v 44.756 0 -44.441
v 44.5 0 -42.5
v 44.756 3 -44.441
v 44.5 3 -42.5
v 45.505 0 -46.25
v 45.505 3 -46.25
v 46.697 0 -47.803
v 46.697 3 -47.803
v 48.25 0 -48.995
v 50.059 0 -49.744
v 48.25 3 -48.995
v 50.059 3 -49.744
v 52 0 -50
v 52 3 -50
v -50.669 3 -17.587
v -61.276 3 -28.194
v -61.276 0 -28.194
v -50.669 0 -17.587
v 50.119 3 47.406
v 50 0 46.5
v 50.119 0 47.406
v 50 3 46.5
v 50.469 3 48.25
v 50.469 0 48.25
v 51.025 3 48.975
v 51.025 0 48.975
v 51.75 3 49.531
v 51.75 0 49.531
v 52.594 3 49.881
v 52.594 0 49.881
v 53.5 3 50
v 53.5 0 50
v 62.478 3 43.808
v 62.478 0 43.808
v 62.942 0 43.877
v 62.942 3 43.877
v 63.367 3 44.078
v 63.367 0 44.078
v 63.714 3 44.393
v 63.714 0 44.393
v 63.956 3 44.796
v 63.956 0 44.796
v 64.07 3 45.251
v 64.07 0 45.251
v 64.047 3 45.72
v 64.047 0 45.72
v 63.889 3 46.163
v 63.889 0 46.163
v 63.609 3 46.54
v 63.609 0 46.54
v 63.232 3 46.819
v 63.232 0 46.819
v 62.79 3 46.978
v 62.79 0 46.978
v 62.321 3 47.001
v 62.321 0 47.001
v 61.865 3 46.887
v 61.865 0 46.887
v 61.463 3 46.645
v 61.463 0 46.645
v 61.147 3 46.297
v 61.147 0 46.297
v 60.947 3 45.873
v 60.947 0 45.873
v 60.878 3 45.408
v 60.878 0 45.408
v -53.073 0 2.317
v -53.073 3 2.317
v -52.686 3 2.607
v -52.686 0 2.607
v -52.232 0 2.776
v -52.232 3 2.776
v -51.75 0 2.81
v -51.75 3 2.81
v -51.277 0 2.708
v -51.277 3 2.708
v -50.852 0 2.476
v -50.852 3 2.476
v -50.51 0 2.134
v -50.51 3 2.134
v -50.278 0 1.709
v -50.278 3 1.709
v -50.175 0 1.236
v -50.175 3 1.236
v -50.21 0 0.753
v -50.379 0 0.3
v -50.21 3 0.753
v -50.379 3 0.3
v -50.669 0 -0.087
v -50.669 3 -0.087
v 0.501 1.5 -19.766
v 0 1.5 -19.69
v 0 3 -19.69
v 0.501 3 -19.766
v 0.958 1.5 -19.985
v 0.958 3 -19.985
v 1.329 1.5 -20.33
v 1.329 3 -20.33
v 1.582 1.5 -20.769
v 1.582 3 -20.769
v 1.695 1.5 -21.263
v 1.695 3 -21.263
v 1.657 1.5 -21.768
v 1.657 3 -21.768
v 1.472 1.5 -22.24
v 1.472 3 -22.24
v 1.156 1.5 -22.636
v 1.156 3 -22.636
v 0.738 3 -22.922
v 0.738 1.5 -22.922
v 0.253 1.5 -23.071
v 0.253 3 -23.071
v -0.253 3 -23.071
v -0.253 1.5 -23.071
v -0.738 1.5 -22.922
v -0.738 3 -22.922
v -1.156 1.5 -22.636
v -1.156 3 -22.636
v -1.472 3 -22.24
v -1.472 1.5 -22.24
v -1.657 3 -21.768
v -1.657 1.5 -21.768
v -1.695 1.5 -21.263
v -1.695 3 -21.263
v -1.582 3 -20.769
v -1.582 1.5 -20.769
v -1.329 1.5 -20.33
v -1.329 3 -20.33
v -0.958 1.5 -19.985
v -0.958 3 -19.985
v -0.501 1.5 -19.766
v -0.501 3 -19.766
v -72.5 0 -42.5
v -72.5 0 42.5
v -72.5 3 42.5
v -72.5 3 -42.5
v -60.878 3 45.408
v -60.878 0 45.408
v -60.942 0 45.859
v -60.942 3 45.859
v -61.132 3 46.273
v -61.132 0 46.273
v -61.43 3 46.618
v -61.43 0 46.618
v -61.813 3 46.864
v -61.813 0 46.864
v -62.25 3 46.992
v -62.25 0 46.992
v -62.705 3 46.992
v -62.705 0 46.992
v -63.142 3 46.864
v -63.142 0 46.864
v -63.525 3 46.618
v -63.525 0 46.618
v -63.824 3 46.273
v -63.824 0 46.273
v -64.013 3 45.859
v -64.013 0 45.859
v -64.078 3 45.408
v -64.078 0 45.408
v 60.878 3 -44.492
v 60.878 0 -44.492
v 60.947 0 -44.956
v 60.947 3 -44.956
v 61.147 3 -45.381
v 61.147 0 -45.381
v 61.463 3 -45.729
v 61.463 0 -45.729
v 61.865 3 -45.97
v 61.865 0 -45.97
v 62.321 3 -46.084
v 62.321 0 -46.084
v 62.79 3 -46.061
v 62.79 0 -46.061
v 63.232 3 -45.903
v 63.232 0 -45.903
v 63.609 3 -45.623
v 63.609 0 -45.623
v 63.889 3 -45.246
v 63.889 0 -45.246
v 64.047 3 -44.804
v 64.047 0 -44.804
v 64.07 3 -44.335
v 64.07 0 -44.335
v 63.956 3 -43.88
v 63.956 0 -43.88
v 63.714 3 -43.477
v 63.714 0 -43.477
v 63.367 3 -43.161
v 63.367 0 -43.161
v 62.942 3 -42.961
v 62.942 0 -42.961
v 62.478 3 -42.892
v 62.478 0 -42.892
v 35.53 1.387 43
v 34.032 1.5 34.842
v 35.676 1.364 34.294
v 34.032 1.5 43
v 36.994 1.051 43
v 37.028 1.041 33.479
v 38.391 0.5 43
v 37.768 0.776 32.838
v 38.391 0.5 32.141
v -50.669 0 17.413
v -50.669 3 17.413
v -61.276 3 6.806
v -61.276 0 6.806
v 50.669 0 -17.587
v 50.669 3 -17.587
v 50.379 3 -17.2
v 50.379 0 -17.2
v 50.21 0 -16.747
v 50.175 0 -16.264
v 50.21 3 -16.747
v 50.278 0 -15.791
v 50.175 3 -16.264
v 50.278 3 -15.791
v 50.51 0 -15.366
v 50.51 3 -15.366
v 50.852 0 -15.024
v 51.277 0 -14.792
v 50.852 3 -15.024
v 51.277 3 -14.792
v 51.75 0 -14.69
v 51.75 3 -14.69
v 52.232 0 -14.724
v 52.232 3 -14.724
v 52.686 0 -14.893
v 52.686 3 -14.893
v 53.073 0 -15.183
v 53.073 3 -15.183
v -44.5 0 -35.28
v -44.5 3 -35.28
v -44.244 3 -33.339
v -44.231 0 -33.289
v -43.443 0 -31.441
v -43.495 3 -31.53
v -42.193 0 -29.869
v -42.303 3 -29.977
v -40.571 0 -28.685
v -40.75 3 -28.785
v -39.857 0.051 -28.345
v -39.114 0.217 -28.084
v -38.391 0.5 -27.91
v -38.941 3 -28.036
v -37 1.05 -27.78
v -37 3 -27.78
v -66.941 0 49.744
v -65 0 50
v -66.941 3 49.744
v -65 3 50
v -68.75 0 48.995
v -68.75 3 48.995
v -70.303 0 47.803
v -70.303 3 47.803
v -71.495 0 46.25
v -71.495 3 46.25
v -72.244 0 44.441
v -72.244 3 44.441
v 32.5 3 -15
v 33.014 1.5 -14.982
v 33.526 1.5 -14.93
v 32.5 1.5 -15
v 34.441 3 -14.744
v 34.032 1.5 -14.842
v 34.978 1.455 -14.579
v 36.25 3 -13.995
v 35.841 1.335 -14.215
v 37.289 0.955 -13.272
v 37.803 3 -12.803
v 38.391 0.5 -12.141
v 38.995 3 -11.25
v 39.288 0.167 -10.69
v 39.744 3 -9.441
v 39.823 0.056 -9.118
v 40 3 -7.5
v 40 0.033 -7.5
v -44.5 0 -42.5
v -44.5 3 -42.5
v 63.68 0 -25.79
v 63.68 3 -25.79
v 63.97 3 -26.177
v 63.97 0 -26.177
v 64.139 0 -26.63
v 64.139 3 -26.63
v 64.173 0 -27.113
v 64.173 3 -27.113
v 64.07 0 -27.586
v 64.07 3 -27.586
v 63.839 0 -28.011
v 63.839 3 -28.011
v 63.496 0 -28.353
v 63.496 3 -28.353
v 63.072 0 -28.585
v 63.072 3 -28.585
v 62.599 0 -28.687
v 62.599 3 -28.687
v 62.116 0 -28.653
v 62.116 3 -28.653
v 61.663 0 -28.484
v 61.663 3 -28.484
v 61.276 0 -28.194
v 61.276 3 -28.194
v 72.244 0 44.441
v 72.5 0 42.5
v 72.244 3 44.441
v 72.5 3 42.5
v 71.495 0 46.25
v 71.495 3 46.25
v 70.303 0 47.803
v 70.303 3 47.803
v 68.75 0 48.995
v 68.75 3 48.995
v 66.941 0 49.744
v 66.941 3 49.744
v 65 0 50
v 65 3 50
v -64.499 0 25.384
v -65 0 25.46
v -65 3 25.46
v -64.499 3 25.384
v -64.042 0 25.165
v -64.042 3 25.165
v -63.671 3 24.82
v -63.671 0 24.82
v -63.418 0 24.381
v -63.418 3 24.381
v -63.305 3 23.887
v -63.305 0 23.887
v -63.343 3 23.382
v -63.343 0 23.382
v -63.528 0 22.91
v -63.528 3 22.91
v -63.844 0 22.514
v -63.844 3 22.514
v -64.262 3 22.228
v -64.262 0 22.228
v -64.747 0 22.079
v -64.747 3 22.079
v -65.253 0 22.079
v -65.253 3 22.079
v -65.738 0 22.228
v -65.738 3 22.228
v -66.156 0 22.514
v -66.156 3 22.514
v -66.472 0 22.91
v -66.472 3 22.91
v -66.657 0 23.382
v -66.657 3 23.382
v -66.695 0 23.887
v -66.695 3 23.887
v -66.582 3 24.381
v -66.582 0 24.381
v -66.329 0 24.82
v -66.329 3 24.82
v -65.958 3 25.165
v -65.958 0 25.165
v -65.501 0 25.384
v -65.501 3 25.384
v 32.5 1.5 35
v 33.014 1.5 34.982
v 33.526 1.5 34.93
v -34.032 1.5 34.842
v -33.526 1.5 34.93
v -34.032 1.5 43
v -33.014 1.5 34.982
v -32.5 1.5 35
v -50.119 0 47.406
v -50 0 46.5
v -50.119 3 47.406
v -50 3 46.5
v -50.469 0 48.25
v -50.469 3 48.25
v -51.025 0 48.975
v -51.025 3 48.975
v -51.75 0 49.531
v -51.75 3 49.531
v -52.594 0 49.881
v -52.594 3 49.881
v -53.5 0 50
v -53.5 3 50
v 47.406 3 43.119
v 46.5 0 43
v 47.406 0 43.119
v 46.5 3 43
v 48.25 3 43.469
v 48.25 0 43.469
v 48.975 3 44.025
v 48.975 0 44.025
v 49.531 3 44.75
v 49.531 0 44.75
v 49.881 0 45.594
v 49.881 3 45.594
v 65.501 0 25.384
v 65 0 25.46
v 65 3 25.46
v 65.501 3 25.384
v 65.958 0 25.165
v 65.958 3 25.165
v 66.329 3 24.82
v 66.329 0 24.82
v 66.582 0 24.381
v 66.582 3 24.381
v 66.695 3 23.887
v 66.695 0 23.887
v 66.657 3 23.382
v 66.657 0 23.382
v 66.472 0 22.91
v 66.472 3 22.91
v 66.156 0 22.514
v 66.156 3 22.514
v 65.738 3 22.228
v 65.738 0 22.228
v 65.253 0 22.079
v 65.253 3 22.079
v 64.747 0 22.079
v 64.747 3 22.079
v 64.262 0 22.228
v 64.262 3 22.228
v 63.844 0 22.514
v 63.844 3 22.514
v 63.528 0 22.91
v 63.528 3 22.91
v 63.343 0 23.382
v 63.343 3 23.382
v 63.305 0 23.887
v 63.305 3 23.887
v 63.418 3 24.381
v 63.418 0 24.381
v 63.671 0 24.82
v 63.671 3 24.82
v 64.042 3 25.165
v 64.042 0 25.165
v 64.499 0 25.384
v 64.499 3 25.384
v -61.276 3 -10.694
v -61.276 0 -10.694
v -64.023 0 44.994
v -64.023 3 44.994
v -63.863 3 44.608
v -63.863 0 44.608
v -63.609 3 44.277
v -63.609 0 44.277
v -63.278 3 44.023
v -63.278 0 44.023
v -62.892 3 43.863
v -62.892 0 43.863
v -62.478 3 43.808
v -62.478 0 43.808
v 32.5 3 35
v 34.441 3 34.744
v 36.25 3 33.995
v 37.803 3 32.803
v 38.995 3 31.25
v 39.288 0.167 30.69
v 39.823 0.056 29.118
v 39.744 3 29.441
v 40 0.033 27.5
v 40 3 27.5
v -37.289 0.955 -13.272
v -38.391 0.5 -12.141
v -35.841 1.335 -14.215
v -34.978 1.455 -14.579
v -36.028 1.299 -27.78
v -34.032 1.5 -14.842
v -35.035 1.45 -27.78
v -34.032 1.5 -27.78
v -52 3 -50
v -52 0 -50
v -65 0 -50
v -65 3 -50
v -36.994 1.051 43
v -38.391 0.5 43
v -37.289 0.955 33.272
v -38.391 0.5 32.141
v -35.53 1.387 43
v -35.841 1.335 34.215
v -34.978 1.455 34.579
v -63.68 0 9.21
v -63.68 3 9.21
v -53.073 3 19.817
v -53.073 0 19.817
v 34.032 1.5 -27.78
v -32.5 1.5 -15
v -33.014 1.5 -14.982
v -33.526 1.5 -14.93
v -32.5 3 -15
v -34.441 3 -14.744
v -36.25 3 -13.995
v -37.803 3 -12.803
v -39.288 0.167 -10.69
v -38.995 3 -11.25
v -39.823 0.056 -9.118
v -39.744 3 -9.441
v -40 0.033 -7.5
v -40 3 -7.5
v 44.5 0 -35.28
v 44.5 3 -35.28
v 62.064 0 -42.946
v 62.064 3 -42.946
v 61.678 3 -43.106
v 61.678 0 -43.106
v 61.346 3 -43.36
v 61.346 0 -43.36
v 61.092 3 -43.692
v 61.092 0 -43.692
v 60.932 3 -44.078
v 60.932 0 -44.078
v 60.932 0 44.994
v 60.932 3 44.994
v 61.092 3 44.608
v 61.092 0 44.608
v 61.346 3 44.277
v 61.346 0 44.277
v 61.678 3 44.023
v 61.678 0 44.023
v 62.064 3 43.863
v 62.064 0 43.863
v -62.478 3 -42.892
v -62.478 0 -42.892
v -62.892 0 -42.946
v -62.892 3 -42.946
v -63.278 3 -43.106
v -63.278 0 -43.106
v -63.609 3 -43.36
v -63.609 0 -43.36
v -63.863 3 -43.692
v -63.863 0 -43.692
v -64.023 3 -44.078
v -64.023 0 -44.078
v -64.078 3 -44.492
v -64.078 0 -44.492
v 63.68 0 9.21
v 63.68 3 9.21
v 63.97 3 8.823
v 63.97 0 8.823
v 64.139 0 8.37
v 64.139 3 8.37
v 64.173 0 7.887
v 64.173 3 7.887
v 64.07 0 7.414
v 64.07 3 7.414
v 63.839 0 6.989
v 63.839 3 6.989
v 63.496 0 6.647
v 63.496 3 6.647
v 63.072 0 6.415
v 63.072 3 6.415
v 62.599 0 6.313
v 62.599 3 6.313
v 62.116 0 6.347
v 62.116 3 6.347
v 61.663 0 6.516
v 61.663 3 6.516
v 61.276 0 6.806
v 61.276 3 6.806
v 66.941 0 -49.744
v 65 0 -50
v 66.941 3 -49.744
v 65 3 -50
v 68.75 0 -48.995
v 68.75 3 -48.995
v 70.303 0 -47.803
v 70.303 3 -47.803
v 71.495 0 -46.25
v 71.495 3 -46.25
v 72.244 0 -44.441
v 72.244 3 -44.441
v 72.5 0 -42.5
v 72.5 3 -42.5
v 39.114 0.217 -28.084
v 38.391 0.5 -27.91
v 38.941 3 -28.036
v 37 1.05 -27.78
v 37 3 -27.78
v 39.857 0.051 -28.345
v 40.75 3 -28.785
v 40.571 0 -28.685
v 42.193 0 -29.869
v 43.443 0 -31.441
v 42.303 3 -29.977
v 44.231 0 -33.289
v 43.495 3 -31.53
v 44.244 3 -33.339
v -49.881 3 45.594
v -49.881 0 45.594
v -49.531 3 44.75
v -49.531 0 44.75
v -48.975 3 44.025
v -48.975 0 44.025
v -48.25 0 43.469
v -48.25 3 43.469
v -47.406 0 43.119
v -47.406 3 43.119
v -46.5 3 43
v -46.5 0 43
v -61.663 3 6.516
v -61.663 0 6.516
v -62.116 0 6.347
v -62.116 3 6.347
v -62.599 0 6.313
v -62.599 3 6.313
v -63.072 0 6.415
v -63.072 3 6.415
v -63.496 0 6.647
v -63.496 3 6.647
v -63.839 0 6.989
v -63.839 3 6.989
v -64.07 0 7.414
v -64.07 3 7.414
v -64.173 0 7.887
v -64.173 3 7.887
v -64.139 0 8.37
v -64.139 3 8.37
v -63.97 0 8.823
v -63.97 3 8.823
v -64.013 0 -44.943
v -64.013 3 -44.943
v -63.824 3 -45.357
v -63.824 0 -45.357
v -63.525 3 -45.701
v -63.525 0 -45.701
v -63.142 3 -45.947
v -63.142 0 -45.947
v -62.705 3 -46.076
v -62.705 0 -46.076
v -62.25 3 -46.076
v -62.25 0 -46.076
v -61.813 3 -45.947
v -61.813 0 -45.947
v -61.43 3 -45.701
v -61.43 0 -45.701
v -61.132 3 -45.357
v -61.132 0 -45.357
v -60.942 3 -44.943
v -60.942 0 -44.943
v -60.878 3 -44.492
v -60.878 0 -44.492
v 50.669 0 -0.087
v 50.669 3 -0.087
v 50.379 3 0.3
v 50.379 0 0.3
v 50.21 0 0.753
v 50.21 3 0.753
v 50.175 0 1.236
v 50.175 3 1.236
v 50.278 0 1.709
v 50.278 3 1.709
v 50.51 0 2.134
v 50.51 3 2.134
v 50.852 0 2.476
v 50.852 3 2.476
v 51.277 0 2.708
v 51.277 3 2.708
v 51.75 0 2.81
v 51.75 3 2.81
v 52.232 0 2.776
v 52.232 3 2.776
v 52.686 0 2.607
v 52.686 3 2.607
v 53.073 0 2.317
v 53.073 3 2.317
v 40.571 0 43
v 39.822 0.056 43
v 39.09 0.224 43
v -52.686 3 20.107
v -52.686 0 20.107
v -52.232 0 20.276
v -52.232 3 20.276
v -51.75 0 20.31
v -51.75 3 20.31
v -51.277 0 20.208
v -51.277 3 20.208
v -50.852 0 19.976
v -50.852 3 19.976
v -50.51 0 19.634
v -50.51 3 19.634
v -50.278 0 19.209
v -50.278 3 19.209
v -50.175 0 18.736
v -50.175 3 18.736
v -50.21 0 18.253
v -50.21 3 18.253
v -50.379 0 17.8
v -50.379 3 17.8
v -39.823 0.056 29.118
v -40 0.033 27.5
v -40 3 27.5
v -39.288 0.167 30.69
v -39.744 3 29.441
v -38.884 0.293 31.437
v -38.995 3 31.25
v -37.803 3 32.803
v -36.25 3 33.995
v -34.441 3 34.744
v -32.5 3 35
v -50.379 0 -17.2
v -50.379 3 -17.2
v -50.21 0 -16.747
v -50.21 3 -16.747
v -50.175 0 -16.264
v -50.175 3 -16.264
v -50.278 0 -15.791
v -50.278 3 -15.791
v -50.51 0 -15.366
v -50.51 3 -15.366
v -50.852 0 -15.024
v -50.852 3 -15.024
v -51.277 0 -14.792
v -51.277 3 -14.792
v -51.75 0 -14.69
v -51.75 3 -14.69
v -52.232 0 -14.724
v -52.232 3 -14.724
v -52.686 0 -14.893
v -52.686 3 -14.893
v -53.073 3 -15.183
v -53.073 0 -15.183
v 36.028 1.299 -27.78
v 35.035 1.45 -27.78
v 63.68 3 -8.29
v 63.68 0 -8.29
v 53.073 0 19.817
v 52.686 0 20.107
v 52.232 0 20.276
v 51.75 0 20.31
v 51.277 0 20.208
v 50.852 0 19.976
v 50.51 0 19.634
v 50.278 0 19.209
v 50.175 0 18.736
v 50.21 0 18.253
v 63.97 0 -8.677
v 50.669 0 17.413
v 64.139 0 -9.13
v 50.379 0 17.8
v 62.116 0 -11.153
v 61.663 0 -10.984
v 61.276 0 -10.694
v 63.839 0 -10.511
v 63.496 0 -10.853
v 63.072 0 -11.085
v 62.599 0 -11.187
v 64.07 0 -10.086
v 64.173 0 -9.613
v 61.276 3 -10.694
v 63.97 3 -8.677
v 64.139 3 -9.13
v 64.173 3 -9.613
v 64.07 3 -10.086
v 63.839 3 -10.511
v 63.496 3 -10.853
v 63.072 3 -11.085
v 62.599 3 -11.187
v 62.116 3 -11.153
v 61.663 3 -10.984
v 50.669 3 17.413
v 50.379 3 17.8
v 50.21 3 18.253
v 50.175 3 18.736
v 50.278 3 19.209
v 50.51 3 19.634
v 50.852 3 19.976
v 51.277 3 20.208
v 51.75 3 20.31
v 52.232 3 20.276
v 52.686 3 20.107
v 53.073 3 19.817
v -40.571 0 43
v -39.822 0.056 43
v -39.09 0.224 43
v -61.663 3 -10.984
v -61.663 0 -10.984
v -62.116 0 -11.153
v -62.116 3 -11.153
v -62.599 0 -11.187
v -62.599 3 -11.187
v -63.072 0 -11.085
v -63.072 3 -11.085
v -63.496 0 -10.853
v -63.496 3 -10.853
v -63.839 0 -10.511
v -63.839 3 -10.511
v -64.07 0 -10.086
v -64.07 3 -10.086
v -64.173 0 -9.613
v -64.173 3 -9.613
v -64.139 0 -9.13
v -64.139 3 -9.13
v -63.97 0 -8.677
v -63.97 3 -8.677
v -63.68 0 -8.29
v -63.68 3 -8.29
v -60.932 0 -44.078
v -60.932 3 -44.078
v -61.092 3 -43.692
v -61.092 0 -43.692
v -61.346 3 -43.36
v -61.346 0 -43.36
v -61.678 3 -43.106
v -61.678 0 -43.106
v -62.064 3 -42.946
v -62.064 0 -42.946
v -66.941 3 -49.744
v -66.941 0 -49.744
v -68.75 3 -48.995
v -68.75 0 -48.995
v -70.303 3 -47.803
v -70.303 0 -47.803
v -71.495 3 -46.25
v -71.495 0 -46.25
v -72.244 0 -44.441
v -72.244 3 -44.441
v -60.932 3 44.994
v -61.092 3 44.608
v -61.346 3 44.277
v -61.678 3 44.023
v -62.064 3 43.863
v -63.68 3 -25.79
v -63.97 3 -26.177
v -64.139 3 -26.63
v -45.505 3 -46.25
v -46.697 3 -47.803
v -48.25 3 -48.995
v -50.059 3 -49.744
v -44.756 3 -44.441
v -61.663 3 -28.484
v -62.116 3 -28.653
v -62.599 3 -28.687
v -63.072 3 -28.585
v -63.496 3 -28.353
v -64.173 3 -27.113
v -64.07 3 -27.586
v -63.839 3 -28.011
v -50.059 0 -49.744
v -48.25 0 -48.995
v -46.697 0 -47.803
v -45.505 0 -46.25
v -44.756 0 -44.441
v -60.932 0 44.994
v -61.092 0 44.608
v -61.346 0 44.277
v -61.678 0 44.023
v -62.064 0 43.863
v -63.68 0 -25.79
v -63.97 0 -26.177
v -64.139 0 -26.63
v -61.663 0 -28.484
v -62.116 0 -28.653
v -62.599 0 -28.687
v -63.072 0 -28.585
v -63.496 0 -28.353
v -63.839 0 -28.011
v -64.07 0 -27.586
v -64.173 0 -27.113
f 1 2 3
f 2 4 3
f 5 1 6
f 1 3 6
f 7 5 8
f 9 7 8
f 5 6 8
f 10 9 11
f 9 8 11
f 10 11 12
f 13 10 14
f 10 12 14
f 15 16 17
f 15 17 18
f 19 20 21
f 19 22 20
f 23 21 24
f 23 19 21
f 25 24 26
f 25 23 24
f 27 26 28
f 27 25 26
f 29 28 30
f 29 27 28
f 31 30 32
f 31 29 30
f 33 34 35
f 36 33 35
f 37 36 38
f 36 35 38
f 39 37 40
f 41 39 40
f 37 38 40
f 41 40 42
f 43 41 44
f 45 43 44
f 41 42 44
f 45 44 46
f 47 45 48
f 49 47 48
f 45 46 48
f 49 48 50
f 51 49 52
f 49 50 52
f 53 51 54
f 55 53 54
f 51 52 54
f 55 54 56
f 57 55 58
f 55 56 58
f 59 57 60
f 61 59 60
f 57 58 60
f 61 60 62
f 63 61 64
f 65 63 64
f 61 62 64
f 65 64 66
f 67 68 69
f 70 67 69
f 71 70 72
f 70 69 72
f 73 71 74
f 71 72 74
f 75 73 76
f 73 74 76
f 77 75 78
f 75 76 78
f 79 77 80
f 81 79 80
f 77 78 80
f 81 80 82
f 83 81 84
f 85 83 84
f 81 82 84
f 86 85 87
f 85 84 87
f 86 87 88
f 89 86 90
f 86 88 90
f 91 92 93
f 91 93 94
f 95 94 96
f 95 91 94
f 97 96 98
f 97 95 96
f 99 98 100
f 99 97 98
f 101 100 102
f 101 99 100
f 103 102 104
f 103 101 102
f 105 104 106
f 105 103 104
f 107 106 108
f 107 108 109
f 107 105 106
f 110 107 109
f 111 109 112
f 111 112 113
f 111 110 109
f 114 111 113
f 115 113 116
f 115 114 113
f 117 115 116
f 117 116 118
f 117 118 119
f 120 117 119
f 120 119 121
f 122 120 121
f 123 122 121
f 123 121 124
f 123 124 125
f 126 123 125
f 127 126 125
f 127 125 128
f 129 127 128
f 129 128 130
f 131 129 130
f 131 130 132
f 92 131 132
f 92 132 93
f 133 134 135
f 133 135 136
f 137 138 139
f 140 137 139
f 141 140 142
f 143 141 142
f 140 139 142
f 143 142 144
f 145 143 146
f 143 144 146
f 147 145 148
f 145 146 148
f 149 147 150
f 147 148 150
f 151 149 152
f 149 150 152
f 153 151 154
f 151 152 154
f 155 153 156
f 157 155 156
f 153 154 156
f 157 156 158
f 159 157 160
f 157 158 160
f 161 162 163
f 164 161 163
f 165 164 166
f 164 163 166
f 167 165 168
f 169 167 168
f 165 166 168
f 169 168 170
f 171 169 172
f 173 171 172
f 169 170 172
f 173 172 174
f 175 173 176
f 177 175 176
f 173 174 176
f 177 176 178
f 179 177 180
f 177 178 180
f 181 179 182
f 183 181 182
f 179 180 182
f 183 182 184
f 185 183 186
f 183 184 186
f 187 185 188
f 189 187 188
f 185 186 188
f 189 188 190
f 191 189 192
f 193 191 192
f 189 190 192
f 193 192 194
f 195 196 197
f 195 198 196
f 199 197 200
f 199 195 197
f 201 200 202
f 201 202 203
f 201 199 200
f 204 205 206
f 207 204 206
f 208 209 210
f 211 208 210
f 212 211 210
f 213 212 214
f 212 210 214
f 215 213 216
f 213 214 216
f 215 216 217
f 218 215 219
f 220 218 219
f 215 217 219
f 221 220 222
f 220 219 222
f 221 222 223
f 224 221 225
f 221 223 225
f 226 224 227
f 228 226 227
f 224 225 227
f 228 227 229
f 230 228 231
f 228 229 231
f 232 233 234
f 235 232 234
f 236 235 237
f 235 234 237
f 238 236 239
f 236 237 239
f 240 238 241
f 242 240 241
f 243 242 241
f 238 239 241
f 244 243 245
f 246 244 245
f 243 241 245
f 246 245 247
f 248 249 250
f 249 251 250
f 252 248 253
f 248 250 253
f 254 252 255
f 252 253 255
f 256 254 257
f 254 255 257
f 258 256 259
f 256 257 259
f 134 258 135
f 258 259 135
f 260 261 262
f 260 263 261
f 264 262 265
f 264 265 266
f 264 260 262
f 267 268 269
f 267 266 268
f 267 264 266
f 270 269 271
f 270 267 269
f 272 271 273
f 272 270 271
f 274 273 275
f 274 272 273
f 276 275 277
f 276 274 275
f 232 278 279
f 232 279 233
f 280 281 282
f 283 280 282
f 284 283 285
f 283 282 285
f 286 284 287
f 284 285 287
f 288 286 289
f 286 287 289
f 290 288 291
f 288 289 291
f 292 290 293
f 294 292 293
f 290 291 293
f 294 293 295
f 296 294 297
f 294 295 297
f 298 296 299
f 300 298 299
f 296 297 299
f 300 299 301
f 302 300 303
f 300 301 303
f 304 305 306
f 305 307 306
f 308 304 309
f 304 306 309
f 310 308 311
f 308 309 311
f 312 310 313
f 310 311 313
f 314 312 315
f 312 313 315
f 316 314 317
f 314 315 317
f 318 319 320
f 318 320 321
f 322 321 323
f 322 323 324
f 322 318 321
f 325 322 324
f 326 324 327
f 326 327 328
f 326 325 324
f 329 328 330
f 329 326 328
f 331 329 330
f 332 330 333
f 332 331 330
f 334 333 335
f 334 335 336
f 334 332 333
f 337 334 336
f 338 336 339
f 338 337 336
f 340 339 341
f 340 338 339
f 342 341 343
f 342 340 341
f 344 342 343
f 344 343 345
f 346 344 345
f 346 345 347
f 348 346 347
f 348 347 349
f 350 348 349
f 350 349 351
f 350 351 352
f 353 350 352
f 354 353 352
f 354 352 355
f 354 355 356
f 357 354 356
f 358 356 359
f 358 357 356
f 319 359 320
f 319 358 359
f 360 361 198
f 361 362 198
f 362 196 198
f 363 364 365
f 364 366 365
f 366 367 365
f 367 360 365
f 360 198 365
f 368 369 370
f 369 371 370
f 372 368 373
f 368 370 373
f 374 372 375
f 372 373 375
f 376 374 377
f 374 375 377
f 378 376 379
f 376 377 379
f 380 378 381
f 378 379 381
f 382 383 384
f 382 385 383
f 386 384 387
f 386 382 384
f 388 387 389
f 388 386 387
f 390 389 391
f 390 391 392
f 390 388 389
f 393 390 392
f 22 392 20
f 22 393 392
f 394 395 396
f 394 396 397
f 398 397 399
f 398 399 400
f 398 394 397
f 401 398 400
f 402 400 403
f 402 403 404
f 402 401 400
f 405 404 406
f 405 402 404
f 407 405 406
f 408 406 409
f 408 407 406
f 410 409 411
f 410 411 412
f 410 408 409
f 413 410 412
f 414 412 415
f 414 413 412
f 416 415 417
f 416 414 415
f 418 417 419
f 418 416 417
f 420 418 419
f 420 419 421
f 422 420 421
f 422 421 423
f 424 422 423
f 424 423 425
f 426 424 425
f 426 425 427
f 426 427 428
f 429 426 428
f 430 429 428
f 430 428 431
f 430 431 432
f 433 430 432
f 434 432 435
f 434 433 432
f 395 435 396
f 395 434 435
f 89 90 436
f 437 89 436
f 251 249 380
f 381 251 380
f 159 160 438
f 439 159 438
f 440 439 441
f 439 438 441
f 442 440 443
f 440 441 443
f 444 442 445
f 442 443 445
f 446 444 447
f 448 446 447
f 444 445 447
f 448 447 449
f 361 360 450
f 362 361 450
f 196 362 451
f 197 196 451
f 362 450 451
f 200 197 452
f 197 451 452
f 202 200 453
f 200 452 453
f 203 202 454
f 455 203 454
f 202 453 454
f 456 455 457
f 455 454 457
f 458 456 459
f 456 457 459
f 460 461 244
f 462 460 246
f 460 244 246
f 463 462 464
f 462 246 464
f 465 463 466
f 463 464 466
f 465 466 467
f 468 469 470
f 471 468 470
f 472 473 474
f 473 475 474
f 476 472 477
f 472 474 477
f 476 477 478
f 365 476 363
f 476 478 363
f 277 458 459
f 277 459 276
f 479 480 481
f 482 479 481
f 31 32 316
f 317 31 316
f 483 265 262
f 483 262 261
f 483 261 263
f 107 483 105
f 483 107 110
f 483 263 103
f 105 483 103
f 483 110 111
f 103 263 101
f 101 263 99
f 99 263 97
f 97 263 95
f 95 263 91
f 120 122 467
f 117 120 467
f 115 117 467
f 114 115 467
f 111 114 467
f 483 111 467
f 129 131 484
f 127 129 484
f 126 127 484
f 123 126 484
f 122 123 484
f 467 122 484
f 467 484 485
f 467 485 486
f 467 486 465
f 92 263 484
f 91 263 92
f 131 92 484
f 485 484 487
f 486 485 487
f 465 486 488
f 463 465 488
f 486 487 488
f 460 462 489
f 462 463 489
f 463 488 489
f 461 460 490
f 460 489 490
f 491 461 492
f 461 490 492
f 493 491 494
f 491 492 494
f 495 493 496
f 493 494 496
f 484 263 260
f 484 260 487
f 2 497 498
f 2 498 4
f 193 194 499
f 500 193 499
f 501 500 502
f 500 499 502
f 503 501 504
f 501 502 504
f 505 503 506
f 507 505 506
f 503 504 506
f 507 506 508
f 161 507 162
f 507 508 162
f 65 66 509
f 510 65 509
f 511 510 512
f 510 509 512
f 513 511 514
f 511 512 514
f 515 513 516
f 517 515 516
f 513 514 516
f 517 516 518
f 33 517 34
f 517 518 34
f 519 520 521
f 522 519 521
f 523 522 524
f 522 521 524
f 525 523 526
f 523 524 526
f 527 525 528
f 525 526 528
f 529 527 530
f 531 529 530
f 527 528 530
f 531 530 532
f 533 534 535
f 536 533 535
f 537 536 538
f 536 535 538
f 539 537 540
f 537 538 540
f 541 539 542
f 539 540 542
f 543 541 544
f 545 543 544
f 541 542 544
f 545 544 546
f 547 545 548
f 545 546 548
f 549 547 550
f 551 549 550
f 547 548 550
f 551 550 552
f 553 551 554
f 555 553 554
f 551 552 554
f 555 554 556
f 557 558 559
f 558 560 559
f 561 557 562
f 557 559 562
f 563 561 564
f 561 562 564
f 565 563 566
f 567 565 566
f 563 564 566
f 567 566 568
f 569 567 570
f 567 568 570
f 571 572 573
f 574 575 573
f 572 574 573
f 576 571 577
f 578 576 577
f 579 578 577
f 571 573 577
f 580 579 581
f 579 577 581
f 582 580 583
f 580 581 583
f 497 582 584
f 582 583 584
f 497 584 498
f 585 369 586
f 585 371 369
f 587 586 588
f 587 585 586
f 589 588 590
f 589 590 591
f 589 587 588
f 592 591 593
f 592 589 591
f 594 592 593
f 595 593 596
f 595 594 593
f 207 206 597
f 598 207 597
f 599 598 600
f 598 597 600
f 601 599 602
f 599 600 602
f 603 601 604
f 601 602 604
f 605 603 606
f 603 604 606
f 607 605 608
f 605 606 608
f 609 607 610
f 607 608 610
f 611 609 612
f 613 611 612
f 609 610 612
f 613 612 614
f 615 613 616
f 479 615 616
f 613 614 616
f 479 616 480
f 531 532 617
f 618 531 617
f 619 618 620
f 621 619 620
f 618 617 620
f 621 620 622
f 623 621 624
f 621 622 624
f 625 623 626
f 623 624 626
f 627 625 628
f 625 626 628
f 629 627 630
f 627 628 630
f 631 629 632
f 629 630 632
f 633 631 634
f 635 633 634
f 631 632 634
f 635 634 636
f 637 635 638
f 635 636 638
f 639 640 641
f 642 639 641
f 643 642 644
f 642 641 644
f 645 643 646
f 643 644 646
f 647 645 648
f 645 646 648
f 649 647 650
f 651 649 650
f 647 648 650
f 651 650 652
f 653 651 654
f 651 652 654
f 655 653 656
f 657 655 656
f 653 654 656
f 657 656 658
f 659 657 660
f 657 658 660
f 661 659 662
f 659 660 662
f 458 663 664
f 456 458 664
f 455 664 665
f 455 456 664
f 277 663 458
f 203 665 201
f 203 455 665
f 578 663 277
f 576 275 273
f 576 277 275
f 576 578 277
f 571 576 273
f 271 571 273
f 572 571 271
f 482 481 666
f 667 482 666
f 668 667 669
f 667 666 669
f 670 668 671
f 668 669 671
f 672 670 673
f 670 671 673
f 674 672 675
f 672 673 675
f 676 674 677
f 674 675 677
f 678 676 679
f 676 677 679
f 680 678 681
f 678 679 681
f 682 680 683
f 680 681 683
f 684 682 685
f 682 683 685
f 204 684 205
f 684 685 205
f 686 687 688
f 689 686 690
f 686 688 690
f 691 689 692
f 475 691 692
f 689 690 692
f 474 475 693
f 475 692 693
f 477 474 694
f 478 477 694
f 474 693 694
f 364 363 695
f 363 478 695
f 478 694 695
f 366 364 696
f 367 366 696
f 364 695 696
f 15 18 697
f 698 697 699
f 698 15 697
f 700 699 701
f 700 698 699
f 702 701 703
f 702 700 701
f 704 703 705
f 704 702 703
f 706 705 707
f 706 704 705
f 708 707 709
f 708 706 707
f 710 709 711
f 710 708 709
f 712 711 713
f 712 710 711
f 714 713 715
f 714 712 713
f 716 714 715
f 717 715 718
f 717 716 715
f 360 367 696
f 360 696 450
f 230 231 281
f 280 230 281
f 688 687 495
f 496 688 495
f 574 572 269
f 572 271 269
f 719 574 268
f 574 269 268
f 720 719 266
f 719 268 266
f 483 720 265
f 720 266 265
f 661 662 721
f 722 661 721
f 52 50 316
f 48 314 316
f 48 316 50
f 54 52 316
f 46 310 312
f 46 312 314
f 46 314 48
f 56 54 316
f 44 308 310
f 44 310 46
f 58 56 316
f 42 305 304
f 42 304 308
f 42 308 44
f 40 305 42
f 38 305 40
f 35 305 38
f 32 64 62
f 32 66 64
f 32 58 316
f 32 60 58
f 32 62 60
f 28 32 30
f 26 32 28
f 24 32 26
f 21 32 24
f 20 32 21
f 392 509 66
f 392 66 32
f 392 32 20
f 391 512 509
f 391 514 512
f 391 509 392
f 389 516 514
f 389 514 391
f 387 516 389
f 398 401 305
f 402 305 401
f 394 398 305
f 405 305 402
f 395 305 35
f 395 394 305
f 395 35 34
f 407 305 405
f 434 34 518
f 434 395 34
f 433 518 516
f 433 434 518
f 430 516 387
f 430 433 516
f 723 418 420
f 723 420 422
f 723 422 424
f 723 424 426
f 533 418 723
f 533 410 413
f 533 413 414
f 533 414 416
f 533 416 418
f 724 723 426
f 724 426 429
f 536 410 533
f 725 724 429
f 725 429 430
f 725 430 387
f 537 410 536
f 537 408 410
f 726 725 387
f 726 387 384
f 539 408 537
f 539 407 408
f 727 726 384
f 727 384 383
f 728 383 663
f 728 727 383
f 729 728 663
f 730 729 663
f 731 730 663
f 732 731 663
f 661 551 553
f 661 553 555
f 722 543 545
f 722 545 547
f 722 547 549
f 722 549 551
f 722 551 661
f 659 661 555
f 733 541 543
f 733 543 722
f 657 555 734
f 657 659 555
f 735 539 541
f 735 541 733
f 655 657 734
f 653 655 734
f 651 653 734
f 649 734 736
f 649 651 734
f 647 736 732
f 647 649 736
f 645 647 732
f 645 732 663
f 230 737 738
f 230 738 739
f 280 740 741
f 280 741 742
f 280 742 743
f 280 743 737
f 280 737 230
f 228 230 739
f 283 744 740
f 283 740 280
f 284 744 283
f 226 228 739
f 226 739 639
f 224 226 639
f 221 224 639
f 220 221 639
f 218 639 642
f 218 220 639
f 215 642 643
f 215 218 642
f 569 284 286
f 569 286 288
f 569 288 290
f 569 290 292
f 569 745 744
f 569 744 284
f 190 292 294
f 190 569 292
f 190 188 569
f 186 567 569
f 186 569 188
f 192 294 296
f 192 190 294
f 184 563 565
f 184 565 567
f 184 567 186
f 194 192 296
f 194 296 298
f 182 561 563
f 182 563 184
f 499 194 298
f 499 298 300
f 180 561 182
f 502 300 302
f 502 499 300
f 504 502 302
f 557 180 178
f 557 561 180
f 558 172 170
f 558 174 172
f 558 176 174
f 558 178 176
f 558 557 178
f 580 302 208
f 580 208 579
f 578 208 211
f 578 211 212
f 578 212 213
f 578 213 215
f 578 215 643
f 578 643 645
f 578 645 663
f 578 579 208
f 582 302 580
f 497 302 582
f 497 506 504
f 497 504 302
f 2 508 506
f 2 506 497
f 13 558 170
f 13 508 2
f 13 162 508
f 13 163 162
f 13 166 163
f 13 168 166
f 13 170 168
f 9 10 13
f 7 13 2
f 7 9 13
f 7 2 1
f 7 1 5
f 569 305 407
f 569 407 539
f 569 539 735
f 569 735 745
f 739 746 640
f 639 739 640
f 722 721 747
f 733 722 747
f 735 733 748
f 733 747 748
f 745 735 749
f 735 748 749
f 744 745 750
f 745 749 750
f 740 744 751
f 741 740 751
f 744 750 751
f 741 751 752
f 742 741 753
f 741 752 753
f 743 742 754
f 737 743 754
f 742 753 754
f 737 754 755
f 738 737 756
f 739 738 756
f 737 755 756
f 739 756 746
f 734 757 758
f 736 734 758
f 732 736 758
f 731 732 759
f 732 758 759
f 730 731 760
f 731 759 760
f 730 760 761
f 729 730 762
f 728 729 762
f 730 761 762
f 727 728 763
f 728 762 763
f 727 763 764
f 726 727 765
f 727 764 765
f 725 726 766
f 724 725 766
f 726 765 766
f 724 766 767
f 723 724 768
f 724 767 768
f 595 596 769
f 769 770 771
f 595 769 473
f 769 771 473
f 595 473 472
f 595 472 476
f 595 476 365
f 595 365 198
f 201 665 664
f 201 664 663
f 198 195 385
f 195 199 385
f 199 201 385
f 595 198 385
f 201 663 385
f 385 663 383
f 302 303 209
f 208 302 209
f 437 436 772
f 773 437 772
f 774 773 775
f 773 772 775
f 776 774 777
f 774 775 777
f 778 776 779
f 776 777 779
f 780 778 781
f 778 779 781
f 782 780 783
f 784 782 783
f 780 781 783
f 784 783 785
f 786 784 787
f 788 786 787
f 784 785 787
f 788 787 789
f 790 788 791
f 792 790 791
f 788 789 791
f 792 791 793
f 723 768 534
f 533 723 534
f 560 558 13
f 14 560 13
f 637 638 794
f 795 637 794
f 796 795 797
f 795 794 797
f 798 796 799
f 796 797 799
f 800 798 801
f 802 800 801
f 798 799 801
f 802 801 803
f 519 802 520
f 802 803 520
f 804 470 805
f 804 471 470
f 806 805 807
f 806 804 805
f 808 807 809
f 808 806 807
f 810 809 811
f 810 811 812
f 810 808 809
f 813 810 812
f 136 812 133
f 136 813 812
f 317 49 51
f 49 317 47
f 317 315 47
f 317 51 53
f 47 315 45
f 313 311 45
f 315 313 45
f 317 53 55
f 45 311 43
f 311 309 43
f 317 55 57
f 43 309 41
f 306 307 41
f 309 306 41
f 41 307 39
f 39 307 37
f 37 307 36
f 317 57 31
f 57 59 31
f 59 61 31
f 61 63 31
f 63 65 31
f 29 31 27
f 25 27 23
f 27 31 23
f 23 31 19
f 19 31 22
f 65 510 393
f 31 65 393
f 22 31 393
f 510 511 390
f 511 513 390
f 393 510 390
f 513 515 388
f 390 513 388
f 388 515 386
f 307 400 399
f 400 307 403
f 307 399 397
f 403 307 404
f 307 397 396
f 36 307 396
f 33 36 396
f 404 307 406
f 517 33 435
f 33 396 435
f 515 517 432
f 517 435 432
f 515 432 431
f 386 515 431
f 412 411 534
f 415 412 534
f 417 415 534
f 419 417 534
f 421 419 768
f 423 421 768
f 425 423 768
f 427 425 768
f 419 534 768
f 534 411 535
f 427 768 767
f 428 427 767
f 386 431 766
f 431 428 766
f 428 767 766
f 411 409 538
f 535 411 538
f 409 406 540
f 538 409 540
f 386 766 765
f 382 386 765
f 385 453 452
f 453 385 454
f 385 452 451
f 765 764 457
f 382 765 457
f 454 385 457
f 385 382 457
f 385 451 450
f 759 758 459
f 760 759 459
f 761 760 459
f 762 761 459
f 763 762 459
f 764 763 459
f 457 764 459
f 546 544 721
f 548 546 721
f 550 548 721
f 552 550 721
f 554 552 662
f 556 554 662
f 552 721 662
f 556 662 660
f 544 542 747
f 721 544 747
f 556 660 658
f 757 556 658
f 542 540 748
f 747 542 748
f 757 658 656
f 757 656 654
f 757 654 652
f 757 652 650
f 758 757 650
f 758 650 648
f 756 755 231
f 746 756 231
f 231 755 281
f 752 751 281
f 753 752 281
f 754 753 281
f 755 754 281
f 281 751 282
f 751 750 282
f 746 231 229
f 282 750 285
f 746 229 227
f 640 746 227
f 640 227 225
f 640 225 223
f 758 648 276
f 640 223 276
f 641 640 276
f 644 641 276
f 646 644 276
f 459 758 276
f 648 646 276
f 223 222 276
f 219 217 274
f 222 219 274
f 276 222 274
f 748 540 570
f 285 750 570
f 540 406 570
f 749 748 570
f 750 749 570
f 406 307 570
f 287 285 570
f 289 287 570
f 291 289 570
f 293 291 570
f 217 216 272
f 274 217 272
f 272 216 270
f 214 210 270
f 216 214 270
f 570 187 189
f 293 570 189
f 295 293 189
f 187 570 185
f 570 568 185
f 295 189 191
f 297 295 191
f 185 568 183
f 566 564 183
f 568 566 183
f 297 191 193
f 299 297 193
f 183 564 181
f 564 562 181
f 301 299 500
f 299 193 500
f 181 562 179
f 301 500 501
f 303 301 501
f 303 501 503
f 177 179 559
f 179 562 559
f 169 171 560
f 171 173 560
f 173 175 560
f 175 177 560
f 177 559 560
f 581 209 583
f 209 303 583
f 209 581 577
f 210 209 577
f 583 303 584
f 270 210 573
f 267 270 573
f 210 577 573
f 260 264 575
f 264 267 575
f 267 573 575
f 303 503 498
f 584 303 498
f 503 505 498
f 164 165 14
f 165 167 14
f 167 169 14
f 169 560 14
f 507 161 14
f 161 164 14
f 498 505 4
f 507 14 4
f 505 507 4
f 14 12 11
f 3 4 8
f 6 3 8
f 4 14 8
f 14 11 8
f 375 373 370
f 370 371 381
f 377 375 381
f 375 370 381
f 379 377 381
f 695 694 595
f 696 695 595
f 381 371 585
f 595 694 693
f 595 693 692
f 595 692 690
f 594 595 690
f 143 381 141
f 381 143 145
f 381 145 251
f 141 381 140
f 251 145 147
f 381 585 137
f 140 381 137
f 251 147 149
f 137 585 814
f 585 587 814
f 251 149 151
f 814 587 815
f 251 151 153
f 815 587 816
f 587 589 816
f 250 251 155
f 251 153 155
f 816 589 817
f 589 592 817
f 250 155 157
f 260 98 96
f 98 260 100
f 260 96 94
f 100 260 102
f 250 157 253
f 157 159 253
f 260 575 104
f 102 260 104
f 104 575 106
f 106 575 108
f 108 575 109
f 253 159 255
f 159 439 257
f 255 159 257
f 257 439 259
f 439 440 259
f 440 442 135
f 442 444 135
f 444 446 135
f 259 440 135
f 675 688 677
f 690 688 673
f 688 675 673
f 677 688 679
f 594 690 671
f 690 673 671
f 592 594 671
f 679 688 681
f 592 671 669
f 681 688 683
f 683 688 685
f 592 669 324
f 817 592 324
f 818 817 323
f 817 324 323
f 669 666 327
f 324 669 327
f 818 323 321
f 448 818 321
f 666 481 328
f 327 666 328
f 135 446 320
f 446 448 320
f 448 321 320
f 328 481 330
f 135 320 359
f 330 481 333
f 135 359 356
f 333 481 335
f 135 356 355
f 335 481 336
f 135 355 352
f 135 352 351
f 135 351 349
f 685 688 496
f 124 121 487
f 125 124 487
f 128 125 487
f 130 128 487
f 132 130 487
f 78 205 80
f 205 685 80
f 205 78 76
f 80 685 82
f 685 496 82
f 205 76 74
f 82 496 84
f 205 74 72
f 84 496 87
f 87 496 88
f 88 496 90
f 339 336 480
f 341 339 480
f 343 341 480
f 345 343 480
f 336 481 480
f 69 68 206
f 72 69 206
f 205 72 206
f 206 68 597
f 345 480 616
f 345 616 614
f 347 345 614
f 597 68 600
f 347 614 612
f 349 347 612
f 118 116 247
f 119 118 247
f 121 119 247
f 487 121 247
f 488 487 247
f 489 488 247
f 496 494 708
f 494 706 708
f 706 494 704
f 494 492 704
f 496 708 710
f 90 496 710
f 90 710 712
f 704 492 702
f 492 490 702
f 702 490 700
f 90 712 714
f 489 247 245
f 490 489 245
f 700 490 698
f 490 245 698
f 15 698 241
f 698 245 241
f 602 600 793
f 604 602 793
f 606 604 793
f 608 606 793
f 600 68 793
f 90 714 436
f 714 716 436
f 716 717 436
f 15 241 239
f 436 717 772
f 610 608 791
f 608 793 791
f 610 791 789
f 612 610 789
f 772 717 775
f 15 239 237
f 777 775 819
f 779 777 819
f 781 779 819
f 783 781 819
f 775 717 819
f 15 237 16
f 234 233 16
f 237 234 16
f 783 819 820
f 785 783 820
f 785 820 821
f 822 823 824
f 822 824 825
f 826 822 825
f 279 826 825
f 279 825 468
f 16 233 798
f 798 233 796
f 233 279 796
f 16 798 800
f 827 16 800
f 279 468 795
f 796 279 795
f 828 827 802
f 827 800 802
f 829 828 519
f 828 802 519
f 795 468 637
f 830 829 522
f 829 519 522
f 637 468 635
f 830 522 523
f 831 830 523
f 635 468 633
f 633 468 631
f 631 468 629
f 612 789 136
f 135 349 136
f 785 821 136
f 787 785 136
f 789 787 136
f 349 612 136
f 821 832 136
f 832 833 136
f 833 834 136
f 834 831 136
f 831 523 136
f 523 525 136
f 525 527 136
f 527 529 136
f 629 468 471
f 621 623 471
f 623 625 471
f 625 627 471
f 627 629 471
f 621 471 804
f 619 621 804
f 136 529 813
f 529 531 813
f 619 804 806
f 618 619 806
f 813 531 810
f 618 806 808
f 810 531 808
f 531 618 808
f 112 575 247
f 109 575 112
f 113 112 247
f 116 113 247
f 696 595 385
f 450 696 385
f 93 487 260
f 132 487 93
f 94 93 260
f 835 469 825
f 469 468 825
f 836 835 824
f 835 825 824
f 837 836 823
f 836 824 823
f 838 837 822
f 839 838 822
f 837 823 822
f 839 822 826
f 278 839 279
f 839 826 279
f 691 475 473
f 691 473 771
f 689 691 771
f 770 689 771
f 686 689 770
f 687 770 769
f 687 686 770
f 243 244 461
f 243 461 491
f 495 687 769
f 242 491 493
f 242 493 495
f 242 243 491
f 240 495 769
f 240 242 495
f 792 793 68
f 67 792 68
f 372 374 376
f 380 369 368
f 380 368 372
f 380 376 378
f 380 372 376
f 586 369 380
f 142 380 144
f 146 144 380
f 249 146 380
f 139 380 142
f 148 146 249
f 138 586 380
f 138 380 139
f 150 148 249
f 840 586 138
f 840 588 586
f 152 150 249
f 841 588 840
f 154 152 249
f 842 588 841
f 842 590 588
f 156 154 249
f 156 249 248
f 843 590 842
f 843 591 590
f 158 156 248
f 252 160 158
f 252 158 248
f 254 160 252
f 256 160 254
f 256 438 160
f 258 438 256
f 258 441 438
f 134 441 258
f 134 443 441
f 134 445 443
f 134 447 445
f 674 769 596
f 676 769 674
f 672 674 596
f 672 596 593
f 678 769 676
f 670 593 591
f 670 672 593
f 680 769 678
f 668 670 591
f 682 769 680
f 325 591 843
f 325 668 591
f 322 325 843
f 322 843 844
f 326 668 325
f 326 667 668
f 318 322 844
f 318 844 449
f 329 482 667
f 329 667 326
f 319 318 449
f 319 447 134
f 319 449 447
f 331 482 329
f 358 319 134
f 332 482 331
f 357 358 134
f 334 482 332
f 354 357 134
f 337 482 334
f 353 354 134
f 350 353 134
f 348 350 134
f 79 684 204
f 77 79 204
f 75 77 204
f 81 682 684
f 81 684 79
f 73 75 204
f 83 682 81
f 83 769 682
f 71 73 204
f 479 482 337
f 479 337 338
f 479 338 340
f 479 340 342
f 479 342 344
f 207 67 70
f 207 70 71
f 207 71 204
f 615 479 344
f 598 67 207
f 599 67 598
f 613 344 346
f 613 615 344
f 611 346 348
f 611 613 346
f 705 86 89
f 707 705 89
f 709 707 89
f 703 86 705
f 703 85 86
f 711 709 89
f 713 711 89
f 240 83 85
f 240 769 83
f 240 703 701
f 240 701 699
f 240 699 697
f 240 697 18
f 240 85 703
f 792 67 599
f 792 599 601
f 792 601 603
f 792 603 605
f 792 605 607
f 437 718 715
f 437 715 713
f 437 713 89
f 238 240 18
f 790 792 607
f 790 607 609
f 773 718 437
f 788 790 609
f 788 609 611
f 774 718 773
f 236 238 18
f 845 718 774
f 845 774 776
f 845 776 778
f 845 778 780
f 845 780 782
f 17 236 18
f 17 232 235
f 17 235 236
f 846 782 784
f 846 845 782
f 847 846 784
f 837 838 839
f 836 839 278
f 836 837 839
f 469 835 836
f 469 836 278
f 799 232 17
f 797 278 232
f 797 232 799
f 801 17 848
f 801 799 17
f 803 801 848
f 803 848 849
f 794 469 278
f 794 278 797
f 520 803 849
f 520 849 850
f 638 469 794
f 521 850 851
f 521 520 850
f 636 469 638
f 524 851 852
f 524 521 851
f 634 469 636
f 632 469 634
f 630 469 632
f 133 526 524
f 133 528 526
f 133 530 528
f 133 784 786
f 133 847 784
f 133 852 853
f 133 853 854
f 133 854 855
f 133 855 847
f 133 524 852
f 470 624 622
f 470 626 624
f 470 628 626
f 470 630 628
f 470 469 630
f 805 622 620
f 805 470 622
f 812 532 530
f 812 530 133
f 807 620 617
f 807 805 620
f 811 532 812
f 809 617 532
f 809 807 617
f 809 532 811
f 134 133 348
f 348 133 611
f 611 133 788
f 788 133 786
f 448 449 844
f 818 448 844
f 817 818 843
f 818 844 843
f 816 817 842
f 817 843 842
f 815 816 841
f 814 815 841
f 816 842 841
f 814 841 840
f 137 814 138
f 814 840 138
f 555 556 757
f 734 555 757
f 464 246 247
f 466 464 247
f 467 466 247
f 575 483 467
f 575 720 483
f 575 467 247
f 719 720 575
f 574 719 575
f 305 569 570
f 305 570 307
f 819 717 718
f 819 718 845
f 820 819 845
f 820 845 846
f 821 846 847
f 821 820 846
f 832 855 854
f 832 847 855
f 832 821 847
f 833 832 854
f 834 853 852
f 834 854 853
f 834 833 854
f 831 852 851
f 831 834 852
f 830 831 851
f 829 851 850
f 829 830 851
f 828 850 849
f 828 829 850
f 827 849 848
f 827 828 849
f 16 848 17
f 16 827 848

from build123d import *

# Parameters (mm, degrees)
SKETCH_1_R          = 1.7
EXTRUDE_1_DEPTH     = 3
FILLET_1_R          = 7.5
FILLET_2_R          = 3.5
CUT_EXTRUDE_5_DEPTH = 10
CUT_EXTRUDE_6_DEPTH = 10
CUT_EXTRUDE_7_DEPTH = 1.5
FILLET_START        = -35.28
FILLET_3_DEPTH      = 78.28
FILLET_4_R          = 10


with BuildPart() as part:
    # 草图1 → 凸台-拉伸1 (new body)
    with BuildSketch(Plane(origin=(0, 0, 0), x_dir=(1, 0, 0), z_dir=(0, 1, 0))):
        Polygon((-67.5, 50), (-44.5, 50), (-44.5, 27.78), (44.5, 27.78), (44.5, 50), (67.5, 50), (72.5, 50), (72.5, -50), (67.5, -50), (50, -50), (50, -43), (0, -43), (-50, -43), (-50, -50), (-67.5, -50), (-72.5, -50), (-72.5, 50), align=None)
        with Locations(Location((0, 21.39, 0), (0, 0, 270))):
            Circle(SKETCH_1_R, mode=Mode.SUBTRACT)
        with Locations(Location((65, -23.76, 0), (0, 0, 270))):
            Circle(SKETCH_1_R, mode=Mode.SUBTRACT)
        with Locations(Location((-65, -23.76, 0), (0, 0, 270))):
            Circle(SKETCH_1_R, mode=Mode.SUBTRACT)
        Polygon((-40, -10), (-40, -35), (40, -35), (40, 15), (-40, 15), align=None, mode=Mode.SUBTRACT)
    extrude(amount=EXTRUDE_1_DEPTH)

    # 圆角1
    fillet_1_edges = [part.edges().sort_by_distance(p)[0] for p in [
        (72.5, 1.5, -50),
        (72.5, 1.5, 50),
        (-72.5, 1.5, 50),
        (-72.5, 1.5, -50),
        (-44.5, 1.5, -50),
        (-44.5, 1.5, -27.78),
        (44.5, 1.5, -27.78),
        (44.5, 1.5, -50),
        (-40, 1.5, -15),
        (-40, 1.5, 35),
        (40, 1.5, 35),
        (40, 1.5, -15),
    ]]
    fillet(fillet_1_edges, radius=FILLET_1_R)

    # 圆角2
    fillet_2_edges = [part.edges().sort_by_distance(p)[0] for p in [
        (50, 1.5, 43),
        (-50, 1.5, 43),
    ]]
    fillet(fillet_2_edges, radius=FILLET_2_R)
    fillet_2_2_edges = [part.edges().sort_by_distance(p)[0] for p in [
        (50, 1.5, 50),
        (-50, 1.5, 50),
    ]]
    fillet(fillet_2_2_edges, radius=FILLET_2_R - 0.0001)  # a hair under: the kernel refuses the full size

    # 草图12 → 切除-拉伸5 (cut)
    with BuildSketch(Plane(origin=(0, 0, 0), x_dir=(-1, 0, 0), z_dir=(0, -1, 0))):
        with BuildLine():
            ThreePointArc((62.47765, -43.808317961), (61.34627915, -44.276947111), (60.87765, -45.408317961))
            Line((60.87765, -45.408317961), (62.47765, -45.408317961))
            Line((62.47765, -45.408317961), (62.47765, -43.808317961))
        make_face()
        with BuildLine():
            Line((62.47765, -45.408317961), (60.87765, -45.408317961))
            ThreePointArc((60.87765, -45.408317961), (62.47765, -47.008317961), (64.07765, -45.408317961))
            ThreePointArc((64.07765, -45.408317961), (63.60902085, -44.276947111), (62.47765, -43.808317961))
            Line((62.47765, -43.808317961), (62.47765, -45.408317961))
        make_face()
        with BuildLine():
            ThreePointArc((-62.47765, -43.808317961), (-63.60902085, -46.539688811), (-60.87765, -45.408317961))
            Line((-60.87765, -45.408317961), (-62.47765, -45.408317961))
            Line((-62.47765, -45.408317961), (-62.47765, -43.808317961))
        make_face()
        with BuildLine():
            Line((-62.47765, -45.408317961), (-60.87765, -45.408317961))
            ThreePointArc((-60.87765, -45.408317961), (-61.34627915, -44.276947111), (-62.47765, -43.808317961))
            Line((-62.47765, -43.808317961), (-62.47765, -45.408317961))
        make_face()
        with BuildLine():
            ThreePointArc((-62.47765, 42.891807039), (-61.34627915, 43.360436189), (-60.87765, 44.491807039))
            Line((-60.87765, 44.491807039), (-62.47765, 44.491807039))
            Line((-62.47765, 44.491807039), (-62.47765, 42.891807039))
        make_face()
        with BuildLine():
            Line((-62.47765, 44.491807039), (-60.87765, 44.491807039))
            ThreePointArc((-60.87765, 44.491807039), (-63.60902085, 45.623177889), (-62.47765, 42.891807039))
            Line((-62.47765, 42.891807039), (-62.47765, 44.491807039))
        make_face()
        with BuildLine():
            ThreePointArc((64.07765, 44.491807039), (62.47765, 46.091807039), (60.87765, 44.491807039))
            Line((60.87765, 44.491807039), (62.47765, 44.491807039))
            Line((62.47765, 44.491807039), (62.47765, 42.891807039))
            ThreePointArc((62.47765, 42.891807039), (63.60902085, 43.360436189), (64.07765, 44.491807039))
        make_face()
        with BuildLine():
            Line((62.47765, 44.491807039), (60.87765, 44.491807039))
            ThreePointArc((60.87765, 44.491807039), (61.34627915, 43.360436189), (62.47765, 42.891807039))
            Line((62.47765, 42.891807039), (62.47765, 44.491807039))
        make_face()
    extrude(amount=-CUT_EXTRUDE_5_DEPTH, mode=Mode.SUBTRACT)

    # 草图13 → 切除-拉伸6 (cut)
    with BuildSketch(Plane(origin=(0, 3, 0), x_dir=(1, 0, 0), z_dir=(0, 1, 0))):
        with BuildLine():
            Line((61.275568472, -6.806111433), (50.668966754, -17.412713151))
            ThreePointArc((50.668966754, -17.412713151), (50.668966754, -19.816876207), (53.07312981, -19.816876207))
            Line((53.07312981, -19.816876207), (63.679731528, -9.210274489))
            ThreePointArc((63.679731528, -9.210274489), (63.679731528, -6.806111433), (61.275568472, -6.806111433))
        make_face()
        with BuildLine():
            Line((-61.275568472, 28.193888567), (-50.668966754, 17.587286849))
            ThreePointArc((-50.668966754, 17.587286849), (-50.668966754, 15.183123793), (-53.07312981, 15.183123793))
            Line((-53.07312981, 15.183123793), (-63.679731528, 25.789725511))
            ThreePointArc((-63.679731528, 25.789725511), (-63.679731528, 28.193888567), (-61.275568472, 28.193888567))
        make_face()
        with BuildLine():
            Line((-63.679731528, 8.289725511), (-53.07312981, -2.316876207))
            ThreePointArc((-53.07312981, -2.316876207), (-50.668966754, -2.316876207), (-50.668966754, 0.087286849))
            Line((-50.668966754, 0.087286849), (-61.275568472, 10.693888567))
            ThreePointArc((-61.275568472, 10.693888567), (-63.679731528, 10.693888567), (-63.679731528, 8.289725511))
        make_face()
        with BuildLine():
            Line((-63.679731528, -9.210274489), (-53.07312981, -19.816876207))
            ThreePointArc((-53.07312981, -19.816876207), (-50.668966754, -19.816876207), (-50.668966754, -17.412713151))
            Line((-50.668966754, -17.412713151), (-61.275568472, -6.806111433))
            ThreePointArc((-61.275568472, -6.806111433), (-63.679731528, -6.806111433), (-63.679731528, -9.210274489))
        make_face()
        with BuildLine():
            Line((61.275568472, 10.693888567), (50.668966754, 0.087286849))
            ThreePointArc((50.668966754, 0.087286849), (50.668966754, -2.316876207), (53.07312981, -2.316876207))
            Line((53.07312981, -2.316876207), (63.679731528, 8.289725511))
            ThreePointArc((63.679731528, 8.289725511), (63.679731528, 10.693888567), (61.275568472, 10.693888567))
        make_face()
        with BuildLine():
            Line((61.275568472, 28.193888567), (50.668966754, 17.587286849))
            ThreePointArc((50.668966754, 17.587286849), (50.668966754, 15.183123793), (53.07312981, 15.183123793))
            Line((53.07312981, 15.183123793), (63.679731528, 25.789725511))
            ThreePointArc((63.679731528, 25.789725511), (63.679731528, 28.193888567), (61.275568472, 28.193888567))
        make_face()
    extrude(amount=-CUT_EXTRUDE_6_DEPTH, mode=Mode.SUBTRACT)

    # 草图14 → 切除-拉伸7 (cut)
    with BuildSketch(Plane.XZ):
        Polygon((-37, 27.78), (-37, 43), (37, 43), (37, 27.78), (37, -27.78), (-37, -27.78), align=None)
    extrude(amount=-CUT_EXTRUDE_7_DEPTH, mode=Mode.SUBTRACT)

    # 圆角3: read off the stored shape, not the designer's step
    # 圆角3 outline → 圆角3 (cut)
    with BuildSketch(Plane.XY.offset(FILLET_START)):
        with BuildLine():
            Line((-40.570714214, 0), (-37, 0))
            Line((-37, 0), (-37, 1.5))
            ThreePointArc((-37, 1.5), (-38.634222541, 0.390227771), (-40.570714214, 0))
        make_face()
        with BuildLine():
            ThreePointArc((40.570714214, 0), (38.634222541, 0.390227771), (37, 1.5))
            Line((37, 1.5), (37, 0))
            Line((37, 0), (40.570714214, 0))
        make_face()
    extrude(amount=FILLET_3_DEPTH, mode=Mode.SUBTRACT)

    # 圆角4
    fillet_4_edges = [part.edges().sort_by_distance(p)[0] for p in [
        (-37, 1.5, 38.25),
        (-37, 1.5, -20.64),
        (37, 1.5, 38.25),
        (37, 1.5, -20.64),
    ]]
    fillet(fillet_4_edges, radius=FILLET_4_R)


solid = part.part
